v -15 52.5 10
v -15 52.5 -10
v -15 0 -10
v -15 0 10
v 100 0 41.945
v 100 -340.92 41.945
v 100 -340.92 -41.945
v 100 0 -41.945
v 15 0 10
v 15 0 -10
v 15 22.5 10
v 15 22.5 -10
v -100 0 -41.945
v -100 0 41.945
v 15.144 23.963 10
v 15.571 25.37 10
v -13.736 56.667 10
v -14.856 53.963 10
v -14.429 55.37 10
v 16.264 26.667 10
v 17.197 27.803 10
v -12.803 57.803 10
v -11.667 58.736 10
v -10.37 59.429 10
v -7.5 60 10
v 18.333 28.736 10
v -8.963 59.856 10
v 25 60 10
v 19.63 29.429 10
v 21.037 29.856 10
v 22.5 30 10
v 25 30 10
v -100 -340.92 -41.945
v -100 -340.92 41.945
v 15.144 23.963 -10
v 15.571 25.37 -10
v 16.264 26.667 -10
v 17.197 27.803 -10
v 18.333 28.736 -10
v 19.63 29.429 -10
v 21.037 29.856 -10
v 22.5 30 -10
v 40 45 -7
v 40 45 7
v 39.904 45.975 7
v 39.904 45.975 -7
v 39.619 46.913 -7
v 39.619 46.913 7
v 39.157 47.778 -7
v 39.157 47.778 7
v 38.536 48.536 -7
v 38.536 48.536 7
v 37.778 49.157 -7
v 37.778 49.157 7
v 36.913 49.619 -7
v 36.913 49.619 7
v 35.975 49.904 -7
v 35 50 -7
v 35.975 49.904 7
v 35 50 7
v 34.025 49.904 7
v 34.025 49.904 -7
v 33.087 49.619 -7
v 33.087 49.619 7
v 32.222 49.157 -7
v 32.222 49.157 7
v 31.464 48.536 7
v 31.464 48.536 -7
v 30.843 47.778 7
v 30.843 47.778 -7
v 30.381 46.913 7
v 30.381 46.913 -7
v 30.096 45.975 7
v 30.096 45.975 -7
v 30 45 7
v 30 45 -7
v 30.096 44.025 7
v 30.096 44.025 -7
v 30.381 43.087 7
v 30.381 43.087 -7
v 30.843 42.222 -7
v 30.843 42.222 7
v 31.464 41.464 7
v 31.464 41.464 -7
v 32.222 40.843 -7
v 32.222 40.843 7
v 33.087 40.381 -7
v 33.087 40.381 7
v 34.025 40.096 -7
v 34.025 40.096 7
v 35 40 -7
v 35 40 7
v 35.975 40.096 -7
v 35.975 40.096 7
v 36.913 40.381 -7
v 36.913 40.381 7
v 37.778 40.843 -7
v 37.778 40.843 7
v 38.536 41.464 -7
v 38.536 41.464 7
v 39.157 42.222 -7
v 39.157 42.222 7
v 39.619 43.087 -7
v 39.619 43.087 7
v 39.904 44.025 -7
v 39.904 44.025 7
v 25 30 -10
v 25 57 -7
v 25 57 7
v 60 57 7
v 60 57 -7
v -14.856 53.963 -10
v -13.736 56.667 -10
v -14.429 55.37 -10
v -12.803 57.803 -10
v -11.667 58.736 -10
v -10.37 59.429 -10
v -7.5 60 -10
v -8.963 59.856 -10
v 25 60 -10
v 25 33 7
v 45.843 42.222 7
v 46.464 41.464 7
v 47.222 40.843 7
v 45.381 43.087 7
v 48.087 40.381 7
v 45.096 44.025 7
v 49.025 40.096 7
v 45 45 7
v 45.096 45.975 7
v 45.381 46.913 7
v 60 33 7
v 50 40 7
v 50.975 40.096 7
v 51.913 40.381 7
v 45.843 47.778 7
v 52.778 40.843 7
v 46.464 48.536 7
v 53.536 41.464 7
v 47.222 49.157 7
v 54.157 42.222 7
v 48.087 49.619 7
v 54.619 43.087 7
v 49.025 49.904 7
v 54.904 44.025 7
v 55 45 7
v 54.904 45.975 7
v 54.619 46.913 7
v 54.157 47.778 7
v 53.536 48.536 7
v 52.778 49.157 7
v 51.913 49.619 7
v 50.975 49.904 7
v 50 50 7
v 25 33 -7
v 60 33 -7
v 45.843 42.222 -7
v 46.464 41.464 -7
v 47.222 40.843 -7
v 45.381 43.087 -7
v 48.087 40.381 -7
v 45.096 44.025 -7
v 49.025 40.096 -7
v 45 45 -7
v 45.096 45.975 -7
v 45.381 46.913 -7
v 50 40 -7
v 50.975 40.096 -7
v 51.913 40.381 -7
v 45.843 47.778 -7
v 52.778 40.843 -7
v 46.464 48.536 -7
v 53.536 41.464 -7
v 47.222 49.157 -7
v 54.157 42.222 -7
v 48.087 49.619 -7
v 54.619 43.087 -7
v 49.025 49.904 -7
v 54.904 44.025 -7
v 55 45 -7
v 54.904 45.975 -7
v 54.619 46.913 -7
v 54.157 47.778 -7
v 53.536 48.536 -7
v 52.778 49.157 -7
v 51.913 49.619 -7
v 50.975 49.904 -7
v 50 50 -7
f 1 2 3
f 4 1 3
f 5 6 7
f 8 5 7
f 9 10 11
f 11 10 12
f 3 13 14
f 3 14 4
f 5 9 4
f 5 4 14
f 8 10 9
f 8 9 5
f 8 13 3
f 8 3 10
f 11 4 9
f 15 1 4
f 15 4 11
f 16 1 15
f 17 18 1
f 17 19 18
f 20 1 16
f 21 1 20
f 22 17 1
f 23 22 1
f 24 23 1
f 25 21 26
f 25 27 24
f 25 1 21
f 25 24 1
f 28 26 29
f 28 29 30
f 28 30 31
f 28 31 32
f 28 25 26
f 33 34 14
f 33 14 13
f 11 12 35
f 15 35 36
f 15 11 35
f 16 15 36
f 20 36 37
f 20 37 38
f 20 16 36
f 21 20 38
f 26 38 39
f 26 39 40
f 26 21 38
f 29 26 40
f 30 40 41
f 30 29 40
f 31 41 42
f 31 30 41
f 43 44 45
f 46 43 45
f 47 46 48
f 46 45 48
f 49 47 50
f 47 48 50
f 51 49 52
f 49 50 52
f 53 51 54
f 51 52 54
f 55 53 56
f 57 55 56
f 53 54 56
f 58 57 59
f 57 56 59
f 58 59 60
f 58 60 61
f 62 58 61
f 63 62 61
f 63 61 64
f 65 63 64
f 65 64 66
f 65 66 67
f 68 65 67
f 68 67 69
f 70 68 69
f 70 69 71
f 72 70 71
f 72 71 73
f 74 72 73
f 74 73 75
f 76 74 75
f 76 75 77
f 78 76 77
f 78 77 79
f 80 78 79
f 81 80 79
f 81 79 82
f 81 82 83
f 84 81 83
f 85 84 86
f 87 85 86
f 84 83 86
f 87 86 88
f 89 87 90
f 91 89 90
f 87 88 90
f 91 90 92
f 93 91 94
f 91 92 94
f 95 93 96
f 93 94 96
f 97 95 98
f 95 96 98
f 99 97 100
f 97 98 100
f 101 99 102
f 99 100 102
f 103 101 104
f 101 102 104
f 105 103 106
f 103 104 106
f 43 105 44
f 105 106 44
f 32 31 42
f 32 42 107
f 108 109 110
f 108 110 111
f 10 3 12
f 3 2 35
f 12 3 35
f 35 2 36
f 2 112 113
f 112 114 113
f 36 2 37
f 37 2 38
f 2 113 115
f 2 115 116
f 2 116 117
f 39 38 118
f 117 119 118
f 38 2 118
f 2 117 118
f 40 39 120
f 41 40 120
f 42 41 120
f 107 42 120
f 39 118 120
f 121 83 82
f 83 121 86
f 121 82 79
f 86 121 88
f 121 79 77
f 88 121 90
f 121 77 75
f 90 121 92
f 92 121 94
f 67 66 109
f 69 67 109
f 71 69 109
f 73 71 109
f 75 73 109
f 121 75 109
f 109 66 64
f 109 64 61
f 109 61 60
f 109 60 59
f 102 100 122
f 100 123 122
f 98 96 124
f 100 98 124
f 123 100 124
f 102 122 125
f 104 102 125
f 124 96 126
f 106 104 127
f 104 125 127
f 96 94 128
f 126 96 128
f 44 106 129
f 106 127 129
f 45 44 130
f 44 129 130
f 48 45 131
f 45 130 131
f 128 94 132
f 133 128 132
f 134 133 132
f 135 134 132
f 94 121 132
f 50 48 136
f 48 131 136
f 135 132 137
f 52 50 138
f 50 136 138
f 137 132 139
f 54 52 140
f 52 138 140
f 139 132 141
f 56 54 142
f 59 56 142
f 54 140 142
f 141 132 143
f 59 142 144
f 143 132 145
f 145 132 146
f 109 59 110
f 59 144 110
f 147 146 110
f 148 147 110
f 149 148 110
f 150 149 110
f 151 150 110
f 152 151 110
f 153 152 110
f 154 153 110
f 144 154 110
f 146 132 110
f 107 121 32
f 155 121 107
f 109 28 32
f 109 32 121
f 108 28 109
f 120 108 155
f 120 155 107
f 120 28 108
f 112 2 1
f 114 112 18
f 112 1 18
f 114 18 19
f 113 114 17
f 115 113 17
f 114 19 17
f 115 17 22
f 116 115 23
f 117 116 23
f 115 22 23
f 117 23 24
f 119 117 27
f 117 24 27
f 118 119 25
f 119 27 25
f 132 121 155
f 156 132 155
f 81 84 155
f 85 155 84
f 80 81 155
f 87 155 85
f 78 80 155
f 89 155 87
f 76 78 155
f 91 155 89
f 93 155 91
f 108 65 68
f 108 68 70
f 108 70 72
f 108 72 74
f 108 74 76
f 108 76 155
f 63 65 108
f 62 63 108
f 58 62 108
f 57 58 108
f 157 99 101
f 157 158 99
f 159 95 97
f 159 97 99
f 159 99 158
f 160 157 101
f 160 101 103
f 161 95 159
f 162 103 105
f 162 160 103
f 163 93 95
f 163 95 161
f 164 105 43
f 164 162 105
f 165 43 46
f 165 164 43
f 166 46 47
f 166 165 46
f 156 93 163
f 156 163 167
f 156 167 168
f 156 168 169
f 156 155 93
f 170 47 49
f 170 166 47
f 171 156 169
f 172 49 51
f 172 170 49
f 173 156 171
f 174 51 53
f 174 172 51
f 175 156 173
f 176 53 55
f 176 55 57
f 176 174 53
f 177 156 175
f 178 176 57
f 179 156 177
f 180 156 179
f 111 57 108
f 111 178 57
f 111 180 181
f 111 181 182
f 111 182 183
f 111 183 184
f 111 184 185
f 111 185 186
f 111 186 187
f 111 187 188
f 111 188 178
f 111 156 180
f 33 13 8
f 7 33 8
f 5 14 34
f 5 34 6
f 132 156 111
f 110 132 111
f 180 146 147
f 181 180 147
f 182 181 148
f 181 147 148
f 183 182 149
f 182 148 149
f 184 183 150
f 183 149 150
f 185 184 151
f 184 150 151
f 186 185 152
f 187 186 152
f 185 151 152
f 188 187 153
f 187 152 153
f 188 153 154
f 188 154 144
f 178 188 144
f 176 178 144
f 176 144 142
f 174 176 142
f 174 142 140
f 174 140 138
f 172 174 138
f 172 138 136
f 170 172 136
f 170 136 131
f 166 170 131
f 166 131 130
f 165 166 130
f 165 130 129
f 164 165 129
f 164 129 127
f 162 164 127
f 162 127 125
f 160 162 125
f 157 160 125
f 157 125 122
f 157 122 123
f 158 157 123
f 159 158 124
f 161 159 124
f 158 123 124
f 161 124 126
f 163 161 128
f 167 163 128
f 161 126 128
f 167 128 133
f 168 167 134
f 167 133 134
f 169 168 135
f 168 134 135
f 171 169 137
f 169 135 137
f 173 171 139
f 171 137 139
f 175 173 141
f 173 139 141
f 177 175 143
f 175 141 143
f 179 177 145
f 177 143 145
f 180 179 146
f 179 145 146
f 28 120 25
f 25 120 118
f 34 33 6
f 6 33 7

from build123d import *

# Parameters (mm, degrees)
SKETCH1_W                  = 200
SKETCH1_H                  = 83.89
WHEEL_STEERING_DUMMY_DEPTH = 340.92
MOUNT_BODY_DEPTH           = 10
MOUNT_BODY_DEPTH_BACK      = 10
SKETCH3_W                  = 20
SKETCH3_H                  = 30
SKETCH3_W_2                = 14
SKETCH3_H_2                = 24
MOUNT_TONGUE_DEPTH         = 35
SKETCH4_R                  = 5
MOUNT_BOLT_HOLES_DEPTH     = 359.639177203
FILLET1_R                  = 7.5


with BuildPart() as part:
    # Sketch1 → Wheel & Steering Dummy (new body)
    with BuildSketch(Plane(origin=(0, 0, 0), x_dir=(1, 0, 0), z_dir=(0, 1, 0))):
        Rectangle(SKETCH1_W, SKETCH1_H)
    extrude(amount=-WHEEL_STEERING_DUMMY_DEPTH)

    # Sketch2 → Mount Body (add, two sides: drawn at the far end of the back side and taken through both)
    with BuildSketch(Plane.XY.offset(-MOUNT_BODY_DEPTH_BACK)):
        Polygon((-15, 0), (15, 0), (15, 30), (60, 30), (60, 60), (15, 60), (-15, 60), align=None)
    extrude(amount=MOUNT_BODY_DEPTH + MOUNT_BODY_DEPTH_BACK)

    # Sketch3 → Mount Tongue (cut)
    with BuildSketch(Plane(origin=(60, 0, 0), x_dir=(0, 0, -1), z_dir=(1, 0, 0))):
        with Locations((0, 45)):
            Rectangle(SKETCH3_W, SKETCH3_H)
        with Locations((0, 45)):
            Rectangle(SKETCH3_W_2, SKETCH3_H_2, mode=Mode.SUBTRACT)
    extrude(amount=-MOUNT_TONGUE_DEPTH, mode=Mode.SUBTRACT)

    # Sketch4 → Mount Bolt Holes (cut, through all)
    with BuildSketch(Plane.XY.offset(7)):
        with Locations((35, 45)):
            Circle(SKETCH4_R)
        with Locations((50, 45)):
            Circle(SKETCH4_R)
    extrude(amount=-MOUNT_BOLT_HOLES_DEPTH, mode=Mode.SUBTRACT)

    # Fillet1
    fillet1_edges = [part.edges().sort_by_distance(p)[0] for p in [
        (-15, 60, 0),
        (15, 30, 0),
    ]]
    fillet(fillet1_edges, radius=FILLET1_R)


solid = part.part
